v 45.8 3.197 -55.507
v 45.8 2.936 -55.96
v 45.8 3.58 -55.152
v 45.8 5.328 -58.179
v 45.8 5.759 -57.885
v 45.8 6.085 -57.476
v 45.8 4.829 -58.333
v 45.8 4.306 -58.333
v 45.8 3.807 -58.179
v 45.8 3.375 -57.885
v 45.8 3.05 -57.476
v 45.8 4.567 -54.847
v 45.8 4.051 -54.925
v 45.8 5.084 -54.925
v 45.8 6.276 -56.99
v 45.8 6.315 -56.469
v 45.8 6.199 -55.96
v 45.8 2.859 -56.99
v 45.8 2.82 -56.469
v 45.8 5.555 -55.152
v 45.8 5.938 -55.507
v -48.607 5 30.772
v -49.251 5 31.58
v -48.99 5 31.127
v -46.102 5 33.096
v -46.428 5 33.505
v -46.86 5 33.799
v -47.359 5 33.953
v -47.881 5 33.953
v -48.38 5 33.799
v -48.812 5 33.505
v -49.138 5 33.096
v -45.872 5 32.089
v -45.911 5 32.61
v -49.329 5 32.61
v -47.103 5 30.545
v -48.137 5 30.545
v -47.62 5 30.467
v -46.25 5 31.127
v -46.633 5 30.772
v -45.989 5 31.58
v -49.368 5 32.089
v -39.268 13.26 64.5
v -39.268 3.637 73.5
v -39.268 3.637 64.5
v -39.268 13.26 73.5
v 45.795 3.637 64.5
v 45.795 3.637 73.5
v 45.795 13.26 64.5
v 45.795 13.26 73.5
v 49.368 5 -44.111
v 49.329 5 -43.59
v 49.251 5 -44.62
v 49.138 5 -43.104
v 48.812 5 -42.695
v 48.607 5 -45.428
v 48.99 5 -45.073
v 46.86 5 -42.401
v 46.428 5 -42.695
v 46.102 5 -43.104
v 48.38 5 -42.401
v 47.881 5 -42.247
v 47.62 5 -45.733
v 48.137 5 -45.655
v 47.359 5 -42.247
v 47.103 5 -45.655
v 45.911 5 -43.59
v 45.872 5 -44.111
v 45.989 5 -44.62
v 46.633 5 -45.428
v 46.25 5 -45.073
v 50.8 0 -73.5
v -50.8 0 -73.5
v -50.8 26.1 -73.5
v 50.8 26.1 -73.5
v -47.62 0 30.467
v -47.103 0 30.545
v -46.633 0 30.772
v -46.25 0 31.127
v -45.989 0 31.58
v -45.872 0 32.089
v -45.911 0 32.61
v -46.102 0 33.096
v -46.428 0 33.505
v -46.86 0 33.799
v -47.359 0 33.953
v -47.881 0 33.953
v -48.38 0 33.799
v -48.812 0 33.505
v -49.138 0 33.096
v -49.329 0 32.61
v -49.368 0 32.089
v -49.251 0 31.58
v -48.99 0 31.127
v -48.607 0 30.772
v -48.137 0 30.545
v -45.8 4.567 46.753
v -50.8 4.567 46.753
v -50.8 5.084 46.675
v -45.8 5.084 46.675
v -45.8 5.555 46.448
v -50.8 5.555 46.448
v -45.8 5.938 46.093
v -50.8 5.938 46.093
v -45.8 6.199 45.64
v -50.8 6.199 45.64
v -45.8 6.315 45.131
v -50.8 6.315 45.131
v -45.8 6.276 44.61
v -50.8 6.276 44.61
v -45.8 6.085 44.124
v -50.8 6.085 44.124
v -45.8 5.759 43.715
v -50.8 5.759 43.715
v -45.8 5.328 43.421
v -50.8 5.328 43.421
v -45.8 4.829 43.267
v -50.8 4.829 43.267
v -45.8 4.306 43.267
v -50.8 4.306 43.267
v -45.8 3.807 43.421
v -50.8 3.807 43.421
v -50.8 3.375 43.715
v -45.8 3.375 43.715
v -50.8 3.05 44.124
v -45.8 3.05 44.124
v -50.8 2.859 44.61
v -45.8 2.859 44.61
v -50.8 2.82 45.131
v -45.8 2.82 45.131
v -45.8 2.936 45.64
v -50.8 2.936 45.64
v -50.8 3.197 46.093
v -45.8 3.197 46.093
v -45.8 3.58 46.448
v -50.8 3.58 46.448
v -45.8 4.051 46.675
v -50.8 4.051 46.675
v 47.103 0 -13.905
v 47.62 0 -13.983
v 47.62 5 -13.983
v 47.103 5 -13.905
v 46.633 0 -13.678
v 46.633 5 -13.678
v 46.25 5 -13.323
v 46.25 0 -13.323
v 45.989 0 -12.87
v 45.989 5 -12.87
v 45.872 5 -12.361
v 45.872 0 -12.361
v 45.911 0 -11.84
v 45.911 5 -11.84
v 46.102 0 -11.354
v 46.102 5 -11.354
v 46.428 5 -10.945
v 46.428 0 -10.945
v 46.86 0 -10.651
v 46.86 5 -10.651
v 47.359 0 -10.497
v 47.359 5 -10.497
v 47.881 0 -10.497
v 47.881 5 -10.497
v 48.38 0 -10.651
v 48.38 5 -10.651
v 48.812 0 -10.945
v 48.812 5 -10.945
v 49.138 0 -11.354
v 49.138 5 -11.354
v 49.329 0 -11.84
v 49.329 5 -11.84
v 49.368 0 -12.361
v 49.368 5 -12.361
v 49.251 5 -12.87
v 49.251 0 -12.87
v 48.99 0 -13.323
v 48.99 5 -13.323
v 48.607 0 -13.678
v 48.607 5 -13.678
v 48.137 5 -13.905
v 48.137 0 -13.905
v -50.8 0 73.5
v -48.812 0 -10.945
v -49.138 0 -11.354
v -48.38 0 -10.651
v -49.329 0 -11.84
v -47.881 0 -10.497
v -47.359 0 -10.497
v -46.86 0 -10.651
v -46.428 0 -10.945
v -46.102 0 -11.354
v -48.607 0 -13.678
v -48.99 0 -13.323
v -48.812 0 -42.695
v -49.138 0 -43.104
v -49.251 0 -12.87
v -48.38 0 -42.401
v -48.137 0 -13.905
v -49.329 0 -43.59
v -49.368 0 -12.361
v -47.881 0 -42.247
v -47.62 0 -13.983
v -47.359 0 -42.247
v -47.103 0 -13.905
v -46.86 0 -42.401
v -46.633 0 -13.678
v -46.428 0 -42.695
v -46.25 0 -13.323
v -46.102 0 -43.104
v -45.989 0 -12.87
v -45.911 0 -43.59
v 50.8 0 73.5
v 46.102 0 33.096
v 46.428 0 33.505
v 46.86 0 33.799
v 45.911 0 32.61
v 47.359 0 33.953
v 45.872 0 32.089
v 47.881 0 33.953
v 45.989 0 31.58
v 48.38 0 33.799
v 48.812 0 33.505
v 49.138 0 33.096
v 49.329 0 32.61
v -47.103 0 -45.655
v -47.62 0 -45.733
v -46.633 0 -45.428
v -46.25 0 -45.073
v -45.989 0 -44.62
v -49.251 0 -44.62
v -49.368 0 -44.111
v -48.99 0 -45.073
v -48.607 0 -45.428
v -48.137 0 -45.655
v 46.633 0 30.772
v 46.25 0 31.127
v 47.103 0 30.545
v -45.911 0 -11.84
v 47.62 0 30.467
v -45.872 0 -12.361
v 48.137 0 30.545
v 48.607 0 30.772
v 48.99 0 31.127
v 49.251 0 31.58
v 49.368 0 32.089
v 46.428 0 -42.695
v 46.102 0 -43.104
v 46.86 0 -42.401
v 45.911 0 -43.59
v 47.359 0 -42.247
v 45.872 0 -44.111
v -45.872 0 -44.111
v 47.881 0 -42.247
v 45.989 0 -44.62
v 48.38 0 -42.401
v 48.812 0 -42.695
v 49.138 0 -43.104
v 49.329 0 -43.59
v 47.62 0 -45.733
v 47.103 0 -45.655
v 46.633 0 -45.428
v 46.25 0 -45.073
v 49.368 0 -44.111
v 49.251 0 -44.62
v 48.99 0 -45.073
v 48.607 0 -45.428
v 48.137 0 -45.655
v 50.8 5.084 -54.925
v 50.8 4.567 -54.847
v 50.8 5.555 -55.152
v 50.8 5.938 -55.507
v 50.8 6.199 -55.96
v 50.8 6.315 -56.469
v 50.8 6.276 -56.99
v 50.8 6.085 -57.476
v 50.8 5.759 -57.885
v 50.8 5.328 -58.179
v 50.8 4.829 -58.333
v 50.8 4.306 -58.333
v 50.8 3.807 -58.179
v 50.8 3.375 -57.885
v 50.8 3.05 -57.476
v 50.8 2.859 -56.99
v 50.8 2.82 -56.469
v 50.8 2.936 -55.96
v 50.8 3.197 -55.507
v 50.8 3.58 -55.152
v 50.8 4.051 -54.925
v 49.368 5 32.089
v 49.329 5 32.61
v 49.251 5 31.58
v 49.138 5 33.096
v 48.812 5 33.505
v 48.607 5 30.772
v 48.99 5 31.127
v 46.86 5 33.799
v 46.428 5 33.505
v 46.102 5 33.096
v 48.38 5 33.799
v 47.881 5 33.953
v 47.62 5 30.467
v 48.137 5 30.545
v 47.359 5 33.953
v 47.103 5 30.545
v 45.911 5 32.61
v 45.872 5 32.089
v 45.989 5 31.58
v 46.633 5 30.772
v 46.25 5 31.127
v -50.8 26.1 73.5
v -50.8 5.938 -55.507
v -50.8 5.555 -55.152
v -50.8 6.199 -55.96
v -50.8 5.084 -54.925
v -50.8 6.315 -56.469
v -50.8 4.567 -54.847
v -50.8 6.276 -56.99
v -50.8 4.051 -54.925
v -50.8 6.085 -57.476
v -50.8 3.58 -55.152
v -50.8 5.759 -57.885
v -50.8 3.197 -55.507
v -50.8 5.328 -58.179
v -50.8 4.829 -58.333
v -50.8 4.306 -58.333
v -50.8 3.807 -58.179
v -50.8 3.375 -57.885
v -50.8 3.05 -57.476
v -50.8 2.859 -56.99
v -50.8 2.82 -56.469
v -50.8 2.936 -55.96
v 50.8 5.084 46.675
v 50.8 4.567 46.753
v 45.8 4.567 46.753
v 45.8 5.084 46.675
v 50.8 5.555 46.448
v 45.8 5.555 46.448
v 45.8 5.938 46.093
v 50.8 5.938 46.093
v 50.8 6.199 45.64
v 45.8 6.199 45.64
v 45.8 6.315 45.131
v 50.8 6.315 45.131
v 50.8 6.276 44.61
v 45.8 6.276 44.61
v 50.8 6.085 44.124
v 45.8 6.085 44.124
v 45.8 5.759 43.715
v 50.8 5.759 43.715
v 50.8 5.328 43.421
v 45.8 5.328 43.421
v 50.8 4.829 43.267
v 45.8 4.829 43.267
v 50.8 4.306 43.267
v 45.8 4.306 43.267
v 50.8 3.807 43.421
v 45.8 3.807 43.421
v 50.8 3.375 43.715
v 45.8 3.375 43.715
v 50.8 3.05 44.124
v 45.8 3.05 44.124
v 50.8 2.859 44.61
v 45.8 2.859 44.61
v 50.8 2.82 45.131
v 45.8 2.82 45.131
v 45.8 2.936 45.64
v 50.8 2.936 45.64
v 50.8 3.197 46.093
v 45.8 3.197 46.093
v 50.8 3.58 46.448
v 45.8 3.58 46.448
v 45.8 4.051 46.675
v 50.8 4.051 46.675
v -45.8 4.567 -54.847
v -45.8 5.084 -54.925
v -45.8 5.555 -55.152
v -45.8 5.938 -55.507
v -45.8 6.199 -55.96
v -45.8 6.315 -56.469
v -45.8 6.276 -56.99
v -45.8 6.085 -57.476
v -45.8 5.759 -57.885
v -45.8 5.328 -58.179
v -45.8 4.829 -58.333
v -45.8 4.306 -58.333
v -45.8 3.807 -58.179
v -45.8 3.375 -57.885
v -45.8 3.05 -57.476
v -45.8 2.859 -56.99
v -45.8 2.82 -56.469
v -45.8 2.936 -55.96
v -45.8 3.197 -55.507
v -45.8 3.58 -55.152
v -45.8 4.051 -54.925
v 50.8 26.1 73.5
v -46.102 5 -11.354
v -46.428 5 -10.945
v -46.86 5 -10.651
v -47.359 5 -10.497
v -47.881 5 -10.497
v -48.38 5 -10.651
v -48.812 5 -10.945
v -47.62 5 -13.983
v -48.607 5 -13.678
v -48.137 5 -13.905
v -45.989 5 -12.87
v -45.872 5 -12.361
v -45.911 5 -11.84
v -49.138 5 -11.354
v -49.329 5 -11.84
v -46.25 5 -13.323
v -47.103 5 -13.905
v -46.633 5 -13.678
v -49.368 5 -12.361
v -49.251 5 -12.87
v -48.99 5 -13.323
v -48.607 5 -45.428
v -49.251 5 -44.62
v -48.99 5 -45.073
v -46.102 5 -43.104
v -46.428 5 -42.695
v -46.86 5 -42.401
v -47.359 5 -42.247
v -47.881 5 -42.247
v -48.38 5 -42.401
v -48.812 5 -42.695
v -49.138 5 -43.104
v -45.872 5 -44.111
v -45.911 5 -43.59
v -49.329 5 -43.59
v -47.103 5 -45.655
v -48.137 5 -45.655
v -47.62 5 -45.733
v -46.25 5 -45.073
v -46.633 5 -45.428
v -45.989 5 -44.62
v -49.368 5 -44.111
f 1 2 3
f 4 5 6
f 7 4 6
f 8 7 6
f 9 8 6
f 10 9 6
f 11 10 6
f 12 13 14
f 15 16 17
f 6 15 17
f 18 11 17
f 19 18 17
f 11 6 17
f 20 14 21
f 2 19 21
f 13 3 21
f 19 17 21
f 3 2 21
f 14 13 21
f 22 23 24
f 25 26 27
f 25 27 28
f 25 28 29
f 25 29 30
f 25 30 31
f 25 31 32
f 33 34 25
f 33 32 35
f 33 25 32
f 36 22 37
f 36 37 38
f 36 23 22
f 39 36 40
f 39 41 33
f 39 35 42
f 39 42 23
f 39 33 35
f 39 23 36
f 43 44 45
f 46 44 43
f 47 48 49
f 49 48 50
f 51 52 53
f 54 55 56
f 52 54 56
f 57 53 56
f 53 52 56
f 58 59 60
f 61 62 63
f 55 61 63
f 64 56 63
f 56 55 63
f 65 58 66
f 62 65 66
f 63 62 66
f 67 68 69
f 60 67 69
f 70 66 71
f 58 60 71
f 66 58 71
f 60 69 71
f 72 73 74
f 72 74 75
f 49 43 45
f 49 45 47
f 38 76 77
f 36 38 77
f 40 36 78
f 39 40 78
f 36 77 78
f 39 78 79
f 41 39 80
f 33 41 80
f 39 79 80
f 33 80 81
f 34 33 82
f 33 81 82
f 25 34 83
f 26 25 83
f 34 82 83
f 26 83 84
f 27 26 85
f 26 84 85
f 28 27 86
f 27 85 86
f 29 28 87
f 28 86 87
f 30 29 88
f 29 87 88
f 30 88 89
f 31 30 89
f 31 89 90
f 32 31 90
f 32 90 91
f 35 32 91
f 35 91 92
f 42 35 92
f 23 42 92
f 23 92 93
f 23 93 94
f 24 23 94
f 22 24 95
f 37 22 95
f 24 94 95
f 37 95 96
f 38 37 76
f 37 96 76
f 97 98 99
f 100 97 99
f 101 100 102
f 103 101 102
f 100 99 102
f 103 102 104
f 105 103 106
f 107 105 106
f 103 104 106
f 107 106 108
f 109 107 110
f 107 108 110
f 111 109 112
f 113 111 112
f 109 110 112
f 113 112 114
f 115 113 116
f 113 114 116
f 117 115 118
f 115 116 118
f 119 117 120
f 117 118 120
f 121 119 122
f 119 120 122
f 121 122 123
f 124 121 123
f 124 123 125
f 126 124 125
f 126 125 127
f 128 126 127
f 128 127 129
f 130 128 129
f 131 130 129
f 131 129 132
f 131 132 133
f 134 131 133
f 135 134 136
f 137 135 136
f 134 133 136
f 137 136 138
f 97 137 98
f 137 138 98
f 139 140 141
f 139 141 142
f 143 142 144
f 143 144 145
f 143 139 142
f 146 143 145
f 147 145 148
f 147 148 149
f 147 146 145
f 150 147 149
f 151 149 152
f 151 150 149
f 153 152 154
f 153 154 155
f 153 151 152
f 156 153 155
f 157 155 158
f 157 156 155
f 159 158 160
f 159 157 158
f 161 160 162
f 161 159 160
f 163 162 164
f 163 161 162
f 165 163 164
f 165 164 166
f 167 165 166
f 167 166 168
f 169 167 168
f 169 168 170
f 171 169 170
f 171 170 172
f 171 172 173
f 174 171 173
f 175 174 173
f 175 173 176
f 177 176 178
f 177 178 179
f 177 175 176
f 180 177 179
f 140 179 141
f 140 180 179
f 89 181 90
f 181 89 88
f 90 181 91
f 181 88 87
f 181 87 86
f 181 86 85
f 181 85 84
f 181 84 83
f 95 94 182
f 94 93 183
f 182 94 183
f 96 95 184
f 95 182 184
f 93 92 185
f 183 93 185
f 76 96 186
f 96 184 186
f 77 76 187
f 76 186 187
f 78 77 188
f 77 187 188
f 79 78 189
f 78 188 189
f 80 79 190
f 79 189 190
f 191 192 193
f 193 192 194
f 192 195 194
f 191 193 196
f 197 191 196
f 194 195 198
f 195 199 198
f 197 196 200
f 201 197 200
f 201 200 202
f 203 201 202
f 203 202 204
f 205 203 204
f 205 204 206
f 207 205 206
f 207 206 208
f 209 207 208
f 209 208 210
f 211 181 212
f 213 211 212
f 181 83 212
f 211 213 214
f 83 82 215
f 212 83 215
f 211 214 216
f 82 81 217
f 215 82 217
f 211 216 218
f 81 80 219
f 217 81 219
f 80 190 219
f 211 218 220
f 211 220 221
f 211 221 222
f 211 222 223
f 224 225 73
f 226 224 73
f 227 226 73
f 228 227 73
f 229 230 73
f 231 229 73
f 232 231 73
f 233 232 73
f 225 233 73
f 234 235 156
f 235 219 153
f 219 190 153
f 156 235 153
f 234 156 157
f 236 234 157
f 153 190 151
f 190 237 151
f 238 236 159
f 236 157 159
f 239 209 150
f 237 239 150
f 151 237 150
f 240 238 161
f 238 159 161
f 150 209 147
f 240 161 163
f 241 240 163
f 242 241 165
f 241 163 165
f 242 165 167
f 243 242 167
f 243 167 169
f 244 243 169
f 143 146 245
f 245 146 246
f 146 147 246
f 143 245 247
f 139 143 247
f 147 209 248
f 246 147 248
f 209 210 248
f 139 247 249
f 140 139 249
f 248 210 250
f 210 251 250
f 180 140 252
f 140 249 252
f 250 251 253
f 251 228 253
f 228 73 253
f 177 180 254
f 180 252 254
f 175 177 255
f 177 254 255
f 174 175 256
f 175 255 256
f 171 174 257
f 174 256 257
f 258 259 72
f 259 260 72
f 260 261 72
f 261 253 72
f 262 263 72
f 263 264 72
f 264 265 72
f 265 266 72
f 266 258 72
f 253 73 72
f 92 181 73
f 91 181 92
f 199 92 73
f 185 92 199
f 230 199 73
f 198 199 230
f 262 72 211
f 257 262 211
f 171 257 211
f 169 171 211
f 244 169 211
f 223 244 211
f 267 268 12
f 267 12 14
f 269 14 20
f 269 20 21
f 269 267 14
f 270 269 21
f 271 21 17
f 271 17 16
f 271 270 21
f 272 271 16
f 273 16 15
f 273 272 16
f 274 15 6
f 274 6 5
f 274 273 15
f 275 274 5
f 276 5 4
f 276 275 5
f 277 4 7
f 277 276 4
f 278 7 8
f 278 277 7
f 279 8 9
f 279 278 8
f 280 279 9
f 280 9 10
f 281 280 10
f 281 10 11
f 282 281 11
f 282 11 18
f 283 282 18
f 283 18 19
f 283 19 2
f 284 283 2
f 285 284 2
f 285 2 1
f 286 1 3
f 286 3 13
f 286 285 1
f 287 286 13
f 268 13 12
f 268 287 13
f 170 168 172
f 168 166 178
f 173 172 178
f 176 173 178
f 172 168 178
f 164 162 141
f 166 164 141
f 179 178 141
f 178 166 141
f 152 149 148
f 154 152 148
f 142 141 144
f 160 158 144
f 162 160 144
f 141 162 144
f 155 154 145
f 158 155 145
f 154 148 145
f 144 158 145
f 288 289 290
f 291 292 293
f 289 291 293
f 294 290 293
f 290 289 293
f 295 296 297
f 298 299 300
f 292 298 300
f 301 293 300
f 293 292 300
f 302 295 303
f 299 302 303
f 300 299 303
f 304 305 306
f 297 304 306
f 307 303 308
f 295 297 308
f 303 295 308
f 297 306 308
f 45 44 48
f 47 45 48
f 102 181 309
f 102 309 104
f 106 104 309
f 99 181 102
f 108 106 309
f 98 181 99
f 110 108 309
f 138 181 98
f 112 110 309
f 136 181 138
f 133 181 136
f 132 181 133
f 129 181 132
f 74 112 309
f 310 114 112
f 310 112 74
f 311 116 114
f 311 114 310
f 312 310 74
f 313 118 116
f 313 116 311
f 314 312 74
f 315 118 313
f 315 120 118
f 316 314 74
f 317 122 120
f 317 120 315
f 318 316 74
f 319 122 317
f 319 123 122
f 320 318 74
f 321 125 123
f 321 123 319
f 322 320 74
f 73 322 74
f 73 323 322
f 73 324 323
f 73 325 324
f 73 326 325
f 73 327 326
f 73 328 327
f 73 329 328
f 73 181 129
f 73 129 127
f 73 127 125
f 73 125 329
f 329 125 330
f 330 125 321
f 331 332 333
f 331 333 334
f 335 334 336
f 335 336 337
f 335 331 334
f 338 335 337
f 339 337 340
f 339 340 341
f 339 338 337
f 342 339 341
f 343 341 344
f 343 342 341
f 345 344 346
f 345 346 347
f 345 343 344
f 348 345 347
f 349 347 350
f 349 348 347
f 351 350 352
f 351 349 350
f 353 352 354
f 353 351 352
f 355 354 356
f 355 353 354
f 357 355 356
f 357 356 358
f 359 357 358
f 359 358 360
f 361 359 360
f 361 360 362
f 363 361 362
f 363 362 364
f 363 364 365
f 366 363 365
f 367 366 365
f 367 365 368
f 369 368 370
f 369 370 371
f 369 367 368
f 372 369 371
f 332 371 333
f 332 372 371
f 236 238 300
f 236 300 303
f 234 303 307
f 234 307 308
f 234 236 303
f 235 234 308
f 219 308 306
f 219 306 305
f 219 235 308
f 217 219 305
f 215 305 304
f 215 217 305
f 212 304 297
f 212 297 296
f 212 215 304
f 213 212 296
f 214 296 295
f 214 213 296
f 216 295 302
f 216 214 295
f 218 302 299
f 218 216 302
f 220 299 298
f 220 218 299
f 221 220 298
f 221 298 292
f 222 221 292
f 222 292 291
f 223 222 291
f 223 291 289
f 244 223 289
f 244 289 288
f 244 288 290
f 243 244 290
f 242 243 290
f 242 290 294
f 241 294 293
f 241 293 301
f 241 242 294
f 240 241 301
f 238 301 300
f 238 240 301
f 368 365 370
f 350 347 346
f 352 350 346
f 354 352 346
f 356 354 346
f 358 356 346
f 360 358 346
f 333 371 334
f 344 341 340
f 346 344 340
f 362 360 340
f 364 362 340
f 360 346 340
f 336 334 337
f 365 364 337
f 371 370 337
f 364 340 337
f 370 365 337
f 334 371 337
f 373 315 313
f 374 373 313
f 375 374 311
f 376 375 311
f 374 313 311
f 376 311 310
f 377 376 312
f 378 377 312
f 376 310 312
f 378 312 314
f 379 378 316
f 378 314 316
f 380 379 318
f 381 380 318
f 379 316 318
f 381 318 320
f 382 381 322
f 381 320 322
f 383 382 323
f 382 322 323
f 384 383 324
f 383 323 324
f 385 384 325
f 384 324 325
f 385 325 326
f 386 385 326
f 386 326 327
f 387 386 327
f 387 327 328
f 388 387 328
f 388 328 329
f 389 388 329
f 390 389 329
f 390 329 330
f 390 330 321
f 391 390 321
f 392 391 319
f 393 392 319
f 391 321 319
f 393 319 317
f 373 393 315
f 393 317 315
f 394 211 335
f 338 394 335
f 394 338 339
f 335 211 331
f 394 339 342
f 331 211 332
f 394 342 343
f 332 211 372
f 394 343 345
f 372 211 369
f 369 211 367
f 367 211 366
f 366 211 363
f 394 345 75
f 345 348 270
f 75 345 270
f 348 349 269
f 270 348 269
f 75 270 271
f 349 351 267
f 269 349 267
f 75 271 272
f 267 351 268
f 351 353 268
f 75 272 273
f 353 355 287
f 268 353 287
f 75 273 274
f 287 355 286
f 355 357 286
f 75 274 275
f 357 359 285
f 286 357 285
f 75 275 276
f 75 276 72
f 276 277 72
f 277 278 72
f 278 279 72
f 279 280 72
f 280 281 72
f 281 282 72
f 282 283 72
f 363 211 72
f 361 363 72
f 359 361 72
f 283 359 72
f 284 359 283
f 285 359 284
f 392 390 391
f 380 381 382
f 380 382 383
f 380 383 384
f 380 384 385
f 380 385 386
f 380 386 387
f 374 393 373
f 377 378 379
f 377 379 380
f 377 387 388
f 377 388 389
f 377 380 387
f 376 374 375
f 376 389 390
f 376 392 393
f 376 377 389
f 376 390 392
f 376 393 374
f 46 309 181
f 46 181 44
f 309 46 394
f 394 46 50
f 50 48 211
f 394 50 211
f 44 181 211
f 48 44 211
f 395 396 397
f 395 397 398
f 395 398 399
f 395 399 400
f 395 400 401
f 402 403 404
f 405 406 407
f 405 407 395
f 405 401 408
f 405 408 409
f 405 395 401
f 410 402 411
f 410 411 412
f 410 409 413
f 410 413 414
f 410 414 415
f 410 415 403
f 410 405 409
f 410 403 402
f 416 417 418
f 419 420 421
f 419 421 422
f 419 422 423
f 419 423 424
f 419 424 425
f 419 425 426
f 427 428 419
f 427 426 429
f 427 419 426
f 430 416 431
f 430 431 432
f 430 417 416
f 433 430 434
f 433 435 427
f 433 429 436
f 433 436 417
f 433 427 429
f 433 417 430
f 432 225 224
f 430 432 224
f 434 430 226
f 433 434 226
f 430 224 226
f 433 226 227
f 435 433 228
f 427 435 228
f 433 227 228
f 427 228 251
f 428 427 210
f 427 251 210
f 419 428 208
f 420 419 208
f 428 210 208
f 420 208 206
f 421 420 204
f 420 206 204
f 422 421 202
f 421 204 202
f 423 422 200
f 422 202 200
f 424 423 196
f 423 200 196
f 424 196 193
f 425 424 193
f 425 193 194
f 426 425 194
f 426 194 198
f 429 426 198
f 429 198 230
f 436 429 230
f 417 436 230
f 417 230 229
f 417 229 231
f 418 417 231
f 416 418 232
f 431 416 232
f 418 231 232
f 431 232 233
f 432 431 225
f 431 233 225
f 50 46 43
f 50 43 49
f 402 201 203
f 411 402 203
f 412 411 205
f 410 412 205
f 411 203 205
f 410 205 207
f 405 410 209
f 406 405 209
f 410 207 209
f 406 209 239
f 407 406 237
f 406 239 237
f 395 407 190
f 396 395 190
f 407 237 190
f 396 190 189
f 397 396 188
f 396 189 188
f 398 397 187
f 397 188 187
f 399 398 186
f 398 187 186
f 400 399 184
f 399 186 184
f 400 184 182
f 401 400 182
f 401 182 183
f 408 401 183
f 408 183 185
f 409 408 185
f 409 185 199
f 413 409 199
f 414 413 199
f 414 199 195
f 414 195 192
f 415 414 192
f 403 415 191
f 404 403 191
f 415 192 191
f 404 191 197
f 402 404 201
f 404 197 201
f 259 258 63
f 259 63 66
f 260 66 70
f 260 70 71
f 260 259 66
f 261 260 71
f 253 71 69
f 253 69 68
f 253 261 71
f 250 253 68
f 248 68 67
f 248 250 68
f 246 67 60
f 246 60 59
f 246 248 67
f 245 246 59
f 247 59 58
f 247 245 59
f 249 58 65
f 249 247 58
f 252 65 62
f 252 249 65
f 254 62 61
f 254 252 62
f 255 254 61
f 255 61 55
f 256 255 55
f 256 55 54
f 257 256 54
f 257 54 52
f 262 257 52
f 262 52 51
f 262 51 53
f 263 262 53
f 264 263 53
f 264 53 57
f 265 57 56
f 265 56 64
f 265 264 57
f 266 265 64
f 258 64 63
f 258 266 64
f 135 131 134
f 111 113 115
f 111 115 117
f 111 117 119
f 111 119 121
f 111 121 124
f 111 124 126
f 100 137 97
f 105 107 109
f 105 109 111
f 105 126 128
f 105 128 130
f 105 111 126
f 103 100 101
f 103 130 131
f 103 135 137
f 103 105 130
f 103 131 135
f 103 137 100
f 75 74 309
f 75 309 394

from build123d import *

# Parameters (mm, degrees)
SKICA1_W                 = 101.6
SKICA1_H                 = 147
P_IDAT_VYSUNUT_M1_DEPTH  = 26.1
SKICA3_W                 = 85.062789824
SKICA3_H                 = 9.622095786
ODEBRAT_VYSUNUT_M2_DEPTH = 9
SKICA2_R                 = 1.7526
ODEBRAT_VYSUNUT_M1_DEPTH = 5
SKICA4_R                 = 1.7526
ODEBRAT_VYSUNUT_M3_DEPTH = 5


with BuildPart() as part:
    # Skica1 → Přidat vysunutím1 (new body)
    with BuildSketch(Plane(origin=(0, 0, 0), x_dir=(1, 0, 0), z_dir=(0, 1, 0))):
        Rectangle(SKICA1_W, SKICA1_H)
    extrude(amount=P_IDAT_VYSUNUT_M1_DEPTH)

    # Skica3 → Odebrat vysunutím2 (cut)
    with BuildSketch(Plane.XY.offset(73.5)):
        with Locations((3.263182855, 8.448501867)):
            Rectangle(SKICA3_W, SKICA3_H)
    extrude(amount=-ODEBRAT_VYSUNUT_M2_DEPTH, mode=Mode.SUBTRACT)

    # Skica2 → Odebrat vysunutím1 (cut)
    with BuildSketch(Plane.XZ):
        with Locations(Location((-47.62, 32.22, 0), (0, 0, 270))):
            Circle(SKICA2_R)
        with Locations(Location((-47.62, -12.23, 0), (0, 0, 270))):
            Circle(SKICA2_R)
        with Locations(Location((-47.62, -43.98, 0), (0, 0, 270))):
            Circle(SKICA2_R)
    odebrat_vysunut_m1 = extrude(amount=-ODEBRAT_VYSUNUT_M1_DEPTH, mode=Mode.SUBTRACT)

    # Skica4 → Odebrat vysunutím3 (cut)
    with BuildSketch(Plane.ZY.offset(50.8)):
        with Locations((45, 4.567395648)):
            Circle(SKICA4_R)
        with Locations((-56.6, 4.567395648)):
            Circle(SKICA4_R)
    odebrat_vysunut_m3 = extrude(amount=-ODEBRAT_VYSUNUT_M3_DEPTH, mode=Mode.SUBTRACT)

    # Zrcadlit1: Odebrat vysunutím1, Odebrat vysunutím3 across plane
    add(odebrat_vysunut_m1.mirror(Plane(origin=(0, 0, 0), x_dir=(0, 0, 1), z_dir=(1, 0, 0))), mode=Mode.SUBTRACT)
    add(odebrat_vysunut_m3.mirror(Plane(origin=(0, 0, 0), x_dir=(0, 0, 1), z_dir=(1, 0, 0))), mode=Mode.SUBTRACT)


solid = part.part
